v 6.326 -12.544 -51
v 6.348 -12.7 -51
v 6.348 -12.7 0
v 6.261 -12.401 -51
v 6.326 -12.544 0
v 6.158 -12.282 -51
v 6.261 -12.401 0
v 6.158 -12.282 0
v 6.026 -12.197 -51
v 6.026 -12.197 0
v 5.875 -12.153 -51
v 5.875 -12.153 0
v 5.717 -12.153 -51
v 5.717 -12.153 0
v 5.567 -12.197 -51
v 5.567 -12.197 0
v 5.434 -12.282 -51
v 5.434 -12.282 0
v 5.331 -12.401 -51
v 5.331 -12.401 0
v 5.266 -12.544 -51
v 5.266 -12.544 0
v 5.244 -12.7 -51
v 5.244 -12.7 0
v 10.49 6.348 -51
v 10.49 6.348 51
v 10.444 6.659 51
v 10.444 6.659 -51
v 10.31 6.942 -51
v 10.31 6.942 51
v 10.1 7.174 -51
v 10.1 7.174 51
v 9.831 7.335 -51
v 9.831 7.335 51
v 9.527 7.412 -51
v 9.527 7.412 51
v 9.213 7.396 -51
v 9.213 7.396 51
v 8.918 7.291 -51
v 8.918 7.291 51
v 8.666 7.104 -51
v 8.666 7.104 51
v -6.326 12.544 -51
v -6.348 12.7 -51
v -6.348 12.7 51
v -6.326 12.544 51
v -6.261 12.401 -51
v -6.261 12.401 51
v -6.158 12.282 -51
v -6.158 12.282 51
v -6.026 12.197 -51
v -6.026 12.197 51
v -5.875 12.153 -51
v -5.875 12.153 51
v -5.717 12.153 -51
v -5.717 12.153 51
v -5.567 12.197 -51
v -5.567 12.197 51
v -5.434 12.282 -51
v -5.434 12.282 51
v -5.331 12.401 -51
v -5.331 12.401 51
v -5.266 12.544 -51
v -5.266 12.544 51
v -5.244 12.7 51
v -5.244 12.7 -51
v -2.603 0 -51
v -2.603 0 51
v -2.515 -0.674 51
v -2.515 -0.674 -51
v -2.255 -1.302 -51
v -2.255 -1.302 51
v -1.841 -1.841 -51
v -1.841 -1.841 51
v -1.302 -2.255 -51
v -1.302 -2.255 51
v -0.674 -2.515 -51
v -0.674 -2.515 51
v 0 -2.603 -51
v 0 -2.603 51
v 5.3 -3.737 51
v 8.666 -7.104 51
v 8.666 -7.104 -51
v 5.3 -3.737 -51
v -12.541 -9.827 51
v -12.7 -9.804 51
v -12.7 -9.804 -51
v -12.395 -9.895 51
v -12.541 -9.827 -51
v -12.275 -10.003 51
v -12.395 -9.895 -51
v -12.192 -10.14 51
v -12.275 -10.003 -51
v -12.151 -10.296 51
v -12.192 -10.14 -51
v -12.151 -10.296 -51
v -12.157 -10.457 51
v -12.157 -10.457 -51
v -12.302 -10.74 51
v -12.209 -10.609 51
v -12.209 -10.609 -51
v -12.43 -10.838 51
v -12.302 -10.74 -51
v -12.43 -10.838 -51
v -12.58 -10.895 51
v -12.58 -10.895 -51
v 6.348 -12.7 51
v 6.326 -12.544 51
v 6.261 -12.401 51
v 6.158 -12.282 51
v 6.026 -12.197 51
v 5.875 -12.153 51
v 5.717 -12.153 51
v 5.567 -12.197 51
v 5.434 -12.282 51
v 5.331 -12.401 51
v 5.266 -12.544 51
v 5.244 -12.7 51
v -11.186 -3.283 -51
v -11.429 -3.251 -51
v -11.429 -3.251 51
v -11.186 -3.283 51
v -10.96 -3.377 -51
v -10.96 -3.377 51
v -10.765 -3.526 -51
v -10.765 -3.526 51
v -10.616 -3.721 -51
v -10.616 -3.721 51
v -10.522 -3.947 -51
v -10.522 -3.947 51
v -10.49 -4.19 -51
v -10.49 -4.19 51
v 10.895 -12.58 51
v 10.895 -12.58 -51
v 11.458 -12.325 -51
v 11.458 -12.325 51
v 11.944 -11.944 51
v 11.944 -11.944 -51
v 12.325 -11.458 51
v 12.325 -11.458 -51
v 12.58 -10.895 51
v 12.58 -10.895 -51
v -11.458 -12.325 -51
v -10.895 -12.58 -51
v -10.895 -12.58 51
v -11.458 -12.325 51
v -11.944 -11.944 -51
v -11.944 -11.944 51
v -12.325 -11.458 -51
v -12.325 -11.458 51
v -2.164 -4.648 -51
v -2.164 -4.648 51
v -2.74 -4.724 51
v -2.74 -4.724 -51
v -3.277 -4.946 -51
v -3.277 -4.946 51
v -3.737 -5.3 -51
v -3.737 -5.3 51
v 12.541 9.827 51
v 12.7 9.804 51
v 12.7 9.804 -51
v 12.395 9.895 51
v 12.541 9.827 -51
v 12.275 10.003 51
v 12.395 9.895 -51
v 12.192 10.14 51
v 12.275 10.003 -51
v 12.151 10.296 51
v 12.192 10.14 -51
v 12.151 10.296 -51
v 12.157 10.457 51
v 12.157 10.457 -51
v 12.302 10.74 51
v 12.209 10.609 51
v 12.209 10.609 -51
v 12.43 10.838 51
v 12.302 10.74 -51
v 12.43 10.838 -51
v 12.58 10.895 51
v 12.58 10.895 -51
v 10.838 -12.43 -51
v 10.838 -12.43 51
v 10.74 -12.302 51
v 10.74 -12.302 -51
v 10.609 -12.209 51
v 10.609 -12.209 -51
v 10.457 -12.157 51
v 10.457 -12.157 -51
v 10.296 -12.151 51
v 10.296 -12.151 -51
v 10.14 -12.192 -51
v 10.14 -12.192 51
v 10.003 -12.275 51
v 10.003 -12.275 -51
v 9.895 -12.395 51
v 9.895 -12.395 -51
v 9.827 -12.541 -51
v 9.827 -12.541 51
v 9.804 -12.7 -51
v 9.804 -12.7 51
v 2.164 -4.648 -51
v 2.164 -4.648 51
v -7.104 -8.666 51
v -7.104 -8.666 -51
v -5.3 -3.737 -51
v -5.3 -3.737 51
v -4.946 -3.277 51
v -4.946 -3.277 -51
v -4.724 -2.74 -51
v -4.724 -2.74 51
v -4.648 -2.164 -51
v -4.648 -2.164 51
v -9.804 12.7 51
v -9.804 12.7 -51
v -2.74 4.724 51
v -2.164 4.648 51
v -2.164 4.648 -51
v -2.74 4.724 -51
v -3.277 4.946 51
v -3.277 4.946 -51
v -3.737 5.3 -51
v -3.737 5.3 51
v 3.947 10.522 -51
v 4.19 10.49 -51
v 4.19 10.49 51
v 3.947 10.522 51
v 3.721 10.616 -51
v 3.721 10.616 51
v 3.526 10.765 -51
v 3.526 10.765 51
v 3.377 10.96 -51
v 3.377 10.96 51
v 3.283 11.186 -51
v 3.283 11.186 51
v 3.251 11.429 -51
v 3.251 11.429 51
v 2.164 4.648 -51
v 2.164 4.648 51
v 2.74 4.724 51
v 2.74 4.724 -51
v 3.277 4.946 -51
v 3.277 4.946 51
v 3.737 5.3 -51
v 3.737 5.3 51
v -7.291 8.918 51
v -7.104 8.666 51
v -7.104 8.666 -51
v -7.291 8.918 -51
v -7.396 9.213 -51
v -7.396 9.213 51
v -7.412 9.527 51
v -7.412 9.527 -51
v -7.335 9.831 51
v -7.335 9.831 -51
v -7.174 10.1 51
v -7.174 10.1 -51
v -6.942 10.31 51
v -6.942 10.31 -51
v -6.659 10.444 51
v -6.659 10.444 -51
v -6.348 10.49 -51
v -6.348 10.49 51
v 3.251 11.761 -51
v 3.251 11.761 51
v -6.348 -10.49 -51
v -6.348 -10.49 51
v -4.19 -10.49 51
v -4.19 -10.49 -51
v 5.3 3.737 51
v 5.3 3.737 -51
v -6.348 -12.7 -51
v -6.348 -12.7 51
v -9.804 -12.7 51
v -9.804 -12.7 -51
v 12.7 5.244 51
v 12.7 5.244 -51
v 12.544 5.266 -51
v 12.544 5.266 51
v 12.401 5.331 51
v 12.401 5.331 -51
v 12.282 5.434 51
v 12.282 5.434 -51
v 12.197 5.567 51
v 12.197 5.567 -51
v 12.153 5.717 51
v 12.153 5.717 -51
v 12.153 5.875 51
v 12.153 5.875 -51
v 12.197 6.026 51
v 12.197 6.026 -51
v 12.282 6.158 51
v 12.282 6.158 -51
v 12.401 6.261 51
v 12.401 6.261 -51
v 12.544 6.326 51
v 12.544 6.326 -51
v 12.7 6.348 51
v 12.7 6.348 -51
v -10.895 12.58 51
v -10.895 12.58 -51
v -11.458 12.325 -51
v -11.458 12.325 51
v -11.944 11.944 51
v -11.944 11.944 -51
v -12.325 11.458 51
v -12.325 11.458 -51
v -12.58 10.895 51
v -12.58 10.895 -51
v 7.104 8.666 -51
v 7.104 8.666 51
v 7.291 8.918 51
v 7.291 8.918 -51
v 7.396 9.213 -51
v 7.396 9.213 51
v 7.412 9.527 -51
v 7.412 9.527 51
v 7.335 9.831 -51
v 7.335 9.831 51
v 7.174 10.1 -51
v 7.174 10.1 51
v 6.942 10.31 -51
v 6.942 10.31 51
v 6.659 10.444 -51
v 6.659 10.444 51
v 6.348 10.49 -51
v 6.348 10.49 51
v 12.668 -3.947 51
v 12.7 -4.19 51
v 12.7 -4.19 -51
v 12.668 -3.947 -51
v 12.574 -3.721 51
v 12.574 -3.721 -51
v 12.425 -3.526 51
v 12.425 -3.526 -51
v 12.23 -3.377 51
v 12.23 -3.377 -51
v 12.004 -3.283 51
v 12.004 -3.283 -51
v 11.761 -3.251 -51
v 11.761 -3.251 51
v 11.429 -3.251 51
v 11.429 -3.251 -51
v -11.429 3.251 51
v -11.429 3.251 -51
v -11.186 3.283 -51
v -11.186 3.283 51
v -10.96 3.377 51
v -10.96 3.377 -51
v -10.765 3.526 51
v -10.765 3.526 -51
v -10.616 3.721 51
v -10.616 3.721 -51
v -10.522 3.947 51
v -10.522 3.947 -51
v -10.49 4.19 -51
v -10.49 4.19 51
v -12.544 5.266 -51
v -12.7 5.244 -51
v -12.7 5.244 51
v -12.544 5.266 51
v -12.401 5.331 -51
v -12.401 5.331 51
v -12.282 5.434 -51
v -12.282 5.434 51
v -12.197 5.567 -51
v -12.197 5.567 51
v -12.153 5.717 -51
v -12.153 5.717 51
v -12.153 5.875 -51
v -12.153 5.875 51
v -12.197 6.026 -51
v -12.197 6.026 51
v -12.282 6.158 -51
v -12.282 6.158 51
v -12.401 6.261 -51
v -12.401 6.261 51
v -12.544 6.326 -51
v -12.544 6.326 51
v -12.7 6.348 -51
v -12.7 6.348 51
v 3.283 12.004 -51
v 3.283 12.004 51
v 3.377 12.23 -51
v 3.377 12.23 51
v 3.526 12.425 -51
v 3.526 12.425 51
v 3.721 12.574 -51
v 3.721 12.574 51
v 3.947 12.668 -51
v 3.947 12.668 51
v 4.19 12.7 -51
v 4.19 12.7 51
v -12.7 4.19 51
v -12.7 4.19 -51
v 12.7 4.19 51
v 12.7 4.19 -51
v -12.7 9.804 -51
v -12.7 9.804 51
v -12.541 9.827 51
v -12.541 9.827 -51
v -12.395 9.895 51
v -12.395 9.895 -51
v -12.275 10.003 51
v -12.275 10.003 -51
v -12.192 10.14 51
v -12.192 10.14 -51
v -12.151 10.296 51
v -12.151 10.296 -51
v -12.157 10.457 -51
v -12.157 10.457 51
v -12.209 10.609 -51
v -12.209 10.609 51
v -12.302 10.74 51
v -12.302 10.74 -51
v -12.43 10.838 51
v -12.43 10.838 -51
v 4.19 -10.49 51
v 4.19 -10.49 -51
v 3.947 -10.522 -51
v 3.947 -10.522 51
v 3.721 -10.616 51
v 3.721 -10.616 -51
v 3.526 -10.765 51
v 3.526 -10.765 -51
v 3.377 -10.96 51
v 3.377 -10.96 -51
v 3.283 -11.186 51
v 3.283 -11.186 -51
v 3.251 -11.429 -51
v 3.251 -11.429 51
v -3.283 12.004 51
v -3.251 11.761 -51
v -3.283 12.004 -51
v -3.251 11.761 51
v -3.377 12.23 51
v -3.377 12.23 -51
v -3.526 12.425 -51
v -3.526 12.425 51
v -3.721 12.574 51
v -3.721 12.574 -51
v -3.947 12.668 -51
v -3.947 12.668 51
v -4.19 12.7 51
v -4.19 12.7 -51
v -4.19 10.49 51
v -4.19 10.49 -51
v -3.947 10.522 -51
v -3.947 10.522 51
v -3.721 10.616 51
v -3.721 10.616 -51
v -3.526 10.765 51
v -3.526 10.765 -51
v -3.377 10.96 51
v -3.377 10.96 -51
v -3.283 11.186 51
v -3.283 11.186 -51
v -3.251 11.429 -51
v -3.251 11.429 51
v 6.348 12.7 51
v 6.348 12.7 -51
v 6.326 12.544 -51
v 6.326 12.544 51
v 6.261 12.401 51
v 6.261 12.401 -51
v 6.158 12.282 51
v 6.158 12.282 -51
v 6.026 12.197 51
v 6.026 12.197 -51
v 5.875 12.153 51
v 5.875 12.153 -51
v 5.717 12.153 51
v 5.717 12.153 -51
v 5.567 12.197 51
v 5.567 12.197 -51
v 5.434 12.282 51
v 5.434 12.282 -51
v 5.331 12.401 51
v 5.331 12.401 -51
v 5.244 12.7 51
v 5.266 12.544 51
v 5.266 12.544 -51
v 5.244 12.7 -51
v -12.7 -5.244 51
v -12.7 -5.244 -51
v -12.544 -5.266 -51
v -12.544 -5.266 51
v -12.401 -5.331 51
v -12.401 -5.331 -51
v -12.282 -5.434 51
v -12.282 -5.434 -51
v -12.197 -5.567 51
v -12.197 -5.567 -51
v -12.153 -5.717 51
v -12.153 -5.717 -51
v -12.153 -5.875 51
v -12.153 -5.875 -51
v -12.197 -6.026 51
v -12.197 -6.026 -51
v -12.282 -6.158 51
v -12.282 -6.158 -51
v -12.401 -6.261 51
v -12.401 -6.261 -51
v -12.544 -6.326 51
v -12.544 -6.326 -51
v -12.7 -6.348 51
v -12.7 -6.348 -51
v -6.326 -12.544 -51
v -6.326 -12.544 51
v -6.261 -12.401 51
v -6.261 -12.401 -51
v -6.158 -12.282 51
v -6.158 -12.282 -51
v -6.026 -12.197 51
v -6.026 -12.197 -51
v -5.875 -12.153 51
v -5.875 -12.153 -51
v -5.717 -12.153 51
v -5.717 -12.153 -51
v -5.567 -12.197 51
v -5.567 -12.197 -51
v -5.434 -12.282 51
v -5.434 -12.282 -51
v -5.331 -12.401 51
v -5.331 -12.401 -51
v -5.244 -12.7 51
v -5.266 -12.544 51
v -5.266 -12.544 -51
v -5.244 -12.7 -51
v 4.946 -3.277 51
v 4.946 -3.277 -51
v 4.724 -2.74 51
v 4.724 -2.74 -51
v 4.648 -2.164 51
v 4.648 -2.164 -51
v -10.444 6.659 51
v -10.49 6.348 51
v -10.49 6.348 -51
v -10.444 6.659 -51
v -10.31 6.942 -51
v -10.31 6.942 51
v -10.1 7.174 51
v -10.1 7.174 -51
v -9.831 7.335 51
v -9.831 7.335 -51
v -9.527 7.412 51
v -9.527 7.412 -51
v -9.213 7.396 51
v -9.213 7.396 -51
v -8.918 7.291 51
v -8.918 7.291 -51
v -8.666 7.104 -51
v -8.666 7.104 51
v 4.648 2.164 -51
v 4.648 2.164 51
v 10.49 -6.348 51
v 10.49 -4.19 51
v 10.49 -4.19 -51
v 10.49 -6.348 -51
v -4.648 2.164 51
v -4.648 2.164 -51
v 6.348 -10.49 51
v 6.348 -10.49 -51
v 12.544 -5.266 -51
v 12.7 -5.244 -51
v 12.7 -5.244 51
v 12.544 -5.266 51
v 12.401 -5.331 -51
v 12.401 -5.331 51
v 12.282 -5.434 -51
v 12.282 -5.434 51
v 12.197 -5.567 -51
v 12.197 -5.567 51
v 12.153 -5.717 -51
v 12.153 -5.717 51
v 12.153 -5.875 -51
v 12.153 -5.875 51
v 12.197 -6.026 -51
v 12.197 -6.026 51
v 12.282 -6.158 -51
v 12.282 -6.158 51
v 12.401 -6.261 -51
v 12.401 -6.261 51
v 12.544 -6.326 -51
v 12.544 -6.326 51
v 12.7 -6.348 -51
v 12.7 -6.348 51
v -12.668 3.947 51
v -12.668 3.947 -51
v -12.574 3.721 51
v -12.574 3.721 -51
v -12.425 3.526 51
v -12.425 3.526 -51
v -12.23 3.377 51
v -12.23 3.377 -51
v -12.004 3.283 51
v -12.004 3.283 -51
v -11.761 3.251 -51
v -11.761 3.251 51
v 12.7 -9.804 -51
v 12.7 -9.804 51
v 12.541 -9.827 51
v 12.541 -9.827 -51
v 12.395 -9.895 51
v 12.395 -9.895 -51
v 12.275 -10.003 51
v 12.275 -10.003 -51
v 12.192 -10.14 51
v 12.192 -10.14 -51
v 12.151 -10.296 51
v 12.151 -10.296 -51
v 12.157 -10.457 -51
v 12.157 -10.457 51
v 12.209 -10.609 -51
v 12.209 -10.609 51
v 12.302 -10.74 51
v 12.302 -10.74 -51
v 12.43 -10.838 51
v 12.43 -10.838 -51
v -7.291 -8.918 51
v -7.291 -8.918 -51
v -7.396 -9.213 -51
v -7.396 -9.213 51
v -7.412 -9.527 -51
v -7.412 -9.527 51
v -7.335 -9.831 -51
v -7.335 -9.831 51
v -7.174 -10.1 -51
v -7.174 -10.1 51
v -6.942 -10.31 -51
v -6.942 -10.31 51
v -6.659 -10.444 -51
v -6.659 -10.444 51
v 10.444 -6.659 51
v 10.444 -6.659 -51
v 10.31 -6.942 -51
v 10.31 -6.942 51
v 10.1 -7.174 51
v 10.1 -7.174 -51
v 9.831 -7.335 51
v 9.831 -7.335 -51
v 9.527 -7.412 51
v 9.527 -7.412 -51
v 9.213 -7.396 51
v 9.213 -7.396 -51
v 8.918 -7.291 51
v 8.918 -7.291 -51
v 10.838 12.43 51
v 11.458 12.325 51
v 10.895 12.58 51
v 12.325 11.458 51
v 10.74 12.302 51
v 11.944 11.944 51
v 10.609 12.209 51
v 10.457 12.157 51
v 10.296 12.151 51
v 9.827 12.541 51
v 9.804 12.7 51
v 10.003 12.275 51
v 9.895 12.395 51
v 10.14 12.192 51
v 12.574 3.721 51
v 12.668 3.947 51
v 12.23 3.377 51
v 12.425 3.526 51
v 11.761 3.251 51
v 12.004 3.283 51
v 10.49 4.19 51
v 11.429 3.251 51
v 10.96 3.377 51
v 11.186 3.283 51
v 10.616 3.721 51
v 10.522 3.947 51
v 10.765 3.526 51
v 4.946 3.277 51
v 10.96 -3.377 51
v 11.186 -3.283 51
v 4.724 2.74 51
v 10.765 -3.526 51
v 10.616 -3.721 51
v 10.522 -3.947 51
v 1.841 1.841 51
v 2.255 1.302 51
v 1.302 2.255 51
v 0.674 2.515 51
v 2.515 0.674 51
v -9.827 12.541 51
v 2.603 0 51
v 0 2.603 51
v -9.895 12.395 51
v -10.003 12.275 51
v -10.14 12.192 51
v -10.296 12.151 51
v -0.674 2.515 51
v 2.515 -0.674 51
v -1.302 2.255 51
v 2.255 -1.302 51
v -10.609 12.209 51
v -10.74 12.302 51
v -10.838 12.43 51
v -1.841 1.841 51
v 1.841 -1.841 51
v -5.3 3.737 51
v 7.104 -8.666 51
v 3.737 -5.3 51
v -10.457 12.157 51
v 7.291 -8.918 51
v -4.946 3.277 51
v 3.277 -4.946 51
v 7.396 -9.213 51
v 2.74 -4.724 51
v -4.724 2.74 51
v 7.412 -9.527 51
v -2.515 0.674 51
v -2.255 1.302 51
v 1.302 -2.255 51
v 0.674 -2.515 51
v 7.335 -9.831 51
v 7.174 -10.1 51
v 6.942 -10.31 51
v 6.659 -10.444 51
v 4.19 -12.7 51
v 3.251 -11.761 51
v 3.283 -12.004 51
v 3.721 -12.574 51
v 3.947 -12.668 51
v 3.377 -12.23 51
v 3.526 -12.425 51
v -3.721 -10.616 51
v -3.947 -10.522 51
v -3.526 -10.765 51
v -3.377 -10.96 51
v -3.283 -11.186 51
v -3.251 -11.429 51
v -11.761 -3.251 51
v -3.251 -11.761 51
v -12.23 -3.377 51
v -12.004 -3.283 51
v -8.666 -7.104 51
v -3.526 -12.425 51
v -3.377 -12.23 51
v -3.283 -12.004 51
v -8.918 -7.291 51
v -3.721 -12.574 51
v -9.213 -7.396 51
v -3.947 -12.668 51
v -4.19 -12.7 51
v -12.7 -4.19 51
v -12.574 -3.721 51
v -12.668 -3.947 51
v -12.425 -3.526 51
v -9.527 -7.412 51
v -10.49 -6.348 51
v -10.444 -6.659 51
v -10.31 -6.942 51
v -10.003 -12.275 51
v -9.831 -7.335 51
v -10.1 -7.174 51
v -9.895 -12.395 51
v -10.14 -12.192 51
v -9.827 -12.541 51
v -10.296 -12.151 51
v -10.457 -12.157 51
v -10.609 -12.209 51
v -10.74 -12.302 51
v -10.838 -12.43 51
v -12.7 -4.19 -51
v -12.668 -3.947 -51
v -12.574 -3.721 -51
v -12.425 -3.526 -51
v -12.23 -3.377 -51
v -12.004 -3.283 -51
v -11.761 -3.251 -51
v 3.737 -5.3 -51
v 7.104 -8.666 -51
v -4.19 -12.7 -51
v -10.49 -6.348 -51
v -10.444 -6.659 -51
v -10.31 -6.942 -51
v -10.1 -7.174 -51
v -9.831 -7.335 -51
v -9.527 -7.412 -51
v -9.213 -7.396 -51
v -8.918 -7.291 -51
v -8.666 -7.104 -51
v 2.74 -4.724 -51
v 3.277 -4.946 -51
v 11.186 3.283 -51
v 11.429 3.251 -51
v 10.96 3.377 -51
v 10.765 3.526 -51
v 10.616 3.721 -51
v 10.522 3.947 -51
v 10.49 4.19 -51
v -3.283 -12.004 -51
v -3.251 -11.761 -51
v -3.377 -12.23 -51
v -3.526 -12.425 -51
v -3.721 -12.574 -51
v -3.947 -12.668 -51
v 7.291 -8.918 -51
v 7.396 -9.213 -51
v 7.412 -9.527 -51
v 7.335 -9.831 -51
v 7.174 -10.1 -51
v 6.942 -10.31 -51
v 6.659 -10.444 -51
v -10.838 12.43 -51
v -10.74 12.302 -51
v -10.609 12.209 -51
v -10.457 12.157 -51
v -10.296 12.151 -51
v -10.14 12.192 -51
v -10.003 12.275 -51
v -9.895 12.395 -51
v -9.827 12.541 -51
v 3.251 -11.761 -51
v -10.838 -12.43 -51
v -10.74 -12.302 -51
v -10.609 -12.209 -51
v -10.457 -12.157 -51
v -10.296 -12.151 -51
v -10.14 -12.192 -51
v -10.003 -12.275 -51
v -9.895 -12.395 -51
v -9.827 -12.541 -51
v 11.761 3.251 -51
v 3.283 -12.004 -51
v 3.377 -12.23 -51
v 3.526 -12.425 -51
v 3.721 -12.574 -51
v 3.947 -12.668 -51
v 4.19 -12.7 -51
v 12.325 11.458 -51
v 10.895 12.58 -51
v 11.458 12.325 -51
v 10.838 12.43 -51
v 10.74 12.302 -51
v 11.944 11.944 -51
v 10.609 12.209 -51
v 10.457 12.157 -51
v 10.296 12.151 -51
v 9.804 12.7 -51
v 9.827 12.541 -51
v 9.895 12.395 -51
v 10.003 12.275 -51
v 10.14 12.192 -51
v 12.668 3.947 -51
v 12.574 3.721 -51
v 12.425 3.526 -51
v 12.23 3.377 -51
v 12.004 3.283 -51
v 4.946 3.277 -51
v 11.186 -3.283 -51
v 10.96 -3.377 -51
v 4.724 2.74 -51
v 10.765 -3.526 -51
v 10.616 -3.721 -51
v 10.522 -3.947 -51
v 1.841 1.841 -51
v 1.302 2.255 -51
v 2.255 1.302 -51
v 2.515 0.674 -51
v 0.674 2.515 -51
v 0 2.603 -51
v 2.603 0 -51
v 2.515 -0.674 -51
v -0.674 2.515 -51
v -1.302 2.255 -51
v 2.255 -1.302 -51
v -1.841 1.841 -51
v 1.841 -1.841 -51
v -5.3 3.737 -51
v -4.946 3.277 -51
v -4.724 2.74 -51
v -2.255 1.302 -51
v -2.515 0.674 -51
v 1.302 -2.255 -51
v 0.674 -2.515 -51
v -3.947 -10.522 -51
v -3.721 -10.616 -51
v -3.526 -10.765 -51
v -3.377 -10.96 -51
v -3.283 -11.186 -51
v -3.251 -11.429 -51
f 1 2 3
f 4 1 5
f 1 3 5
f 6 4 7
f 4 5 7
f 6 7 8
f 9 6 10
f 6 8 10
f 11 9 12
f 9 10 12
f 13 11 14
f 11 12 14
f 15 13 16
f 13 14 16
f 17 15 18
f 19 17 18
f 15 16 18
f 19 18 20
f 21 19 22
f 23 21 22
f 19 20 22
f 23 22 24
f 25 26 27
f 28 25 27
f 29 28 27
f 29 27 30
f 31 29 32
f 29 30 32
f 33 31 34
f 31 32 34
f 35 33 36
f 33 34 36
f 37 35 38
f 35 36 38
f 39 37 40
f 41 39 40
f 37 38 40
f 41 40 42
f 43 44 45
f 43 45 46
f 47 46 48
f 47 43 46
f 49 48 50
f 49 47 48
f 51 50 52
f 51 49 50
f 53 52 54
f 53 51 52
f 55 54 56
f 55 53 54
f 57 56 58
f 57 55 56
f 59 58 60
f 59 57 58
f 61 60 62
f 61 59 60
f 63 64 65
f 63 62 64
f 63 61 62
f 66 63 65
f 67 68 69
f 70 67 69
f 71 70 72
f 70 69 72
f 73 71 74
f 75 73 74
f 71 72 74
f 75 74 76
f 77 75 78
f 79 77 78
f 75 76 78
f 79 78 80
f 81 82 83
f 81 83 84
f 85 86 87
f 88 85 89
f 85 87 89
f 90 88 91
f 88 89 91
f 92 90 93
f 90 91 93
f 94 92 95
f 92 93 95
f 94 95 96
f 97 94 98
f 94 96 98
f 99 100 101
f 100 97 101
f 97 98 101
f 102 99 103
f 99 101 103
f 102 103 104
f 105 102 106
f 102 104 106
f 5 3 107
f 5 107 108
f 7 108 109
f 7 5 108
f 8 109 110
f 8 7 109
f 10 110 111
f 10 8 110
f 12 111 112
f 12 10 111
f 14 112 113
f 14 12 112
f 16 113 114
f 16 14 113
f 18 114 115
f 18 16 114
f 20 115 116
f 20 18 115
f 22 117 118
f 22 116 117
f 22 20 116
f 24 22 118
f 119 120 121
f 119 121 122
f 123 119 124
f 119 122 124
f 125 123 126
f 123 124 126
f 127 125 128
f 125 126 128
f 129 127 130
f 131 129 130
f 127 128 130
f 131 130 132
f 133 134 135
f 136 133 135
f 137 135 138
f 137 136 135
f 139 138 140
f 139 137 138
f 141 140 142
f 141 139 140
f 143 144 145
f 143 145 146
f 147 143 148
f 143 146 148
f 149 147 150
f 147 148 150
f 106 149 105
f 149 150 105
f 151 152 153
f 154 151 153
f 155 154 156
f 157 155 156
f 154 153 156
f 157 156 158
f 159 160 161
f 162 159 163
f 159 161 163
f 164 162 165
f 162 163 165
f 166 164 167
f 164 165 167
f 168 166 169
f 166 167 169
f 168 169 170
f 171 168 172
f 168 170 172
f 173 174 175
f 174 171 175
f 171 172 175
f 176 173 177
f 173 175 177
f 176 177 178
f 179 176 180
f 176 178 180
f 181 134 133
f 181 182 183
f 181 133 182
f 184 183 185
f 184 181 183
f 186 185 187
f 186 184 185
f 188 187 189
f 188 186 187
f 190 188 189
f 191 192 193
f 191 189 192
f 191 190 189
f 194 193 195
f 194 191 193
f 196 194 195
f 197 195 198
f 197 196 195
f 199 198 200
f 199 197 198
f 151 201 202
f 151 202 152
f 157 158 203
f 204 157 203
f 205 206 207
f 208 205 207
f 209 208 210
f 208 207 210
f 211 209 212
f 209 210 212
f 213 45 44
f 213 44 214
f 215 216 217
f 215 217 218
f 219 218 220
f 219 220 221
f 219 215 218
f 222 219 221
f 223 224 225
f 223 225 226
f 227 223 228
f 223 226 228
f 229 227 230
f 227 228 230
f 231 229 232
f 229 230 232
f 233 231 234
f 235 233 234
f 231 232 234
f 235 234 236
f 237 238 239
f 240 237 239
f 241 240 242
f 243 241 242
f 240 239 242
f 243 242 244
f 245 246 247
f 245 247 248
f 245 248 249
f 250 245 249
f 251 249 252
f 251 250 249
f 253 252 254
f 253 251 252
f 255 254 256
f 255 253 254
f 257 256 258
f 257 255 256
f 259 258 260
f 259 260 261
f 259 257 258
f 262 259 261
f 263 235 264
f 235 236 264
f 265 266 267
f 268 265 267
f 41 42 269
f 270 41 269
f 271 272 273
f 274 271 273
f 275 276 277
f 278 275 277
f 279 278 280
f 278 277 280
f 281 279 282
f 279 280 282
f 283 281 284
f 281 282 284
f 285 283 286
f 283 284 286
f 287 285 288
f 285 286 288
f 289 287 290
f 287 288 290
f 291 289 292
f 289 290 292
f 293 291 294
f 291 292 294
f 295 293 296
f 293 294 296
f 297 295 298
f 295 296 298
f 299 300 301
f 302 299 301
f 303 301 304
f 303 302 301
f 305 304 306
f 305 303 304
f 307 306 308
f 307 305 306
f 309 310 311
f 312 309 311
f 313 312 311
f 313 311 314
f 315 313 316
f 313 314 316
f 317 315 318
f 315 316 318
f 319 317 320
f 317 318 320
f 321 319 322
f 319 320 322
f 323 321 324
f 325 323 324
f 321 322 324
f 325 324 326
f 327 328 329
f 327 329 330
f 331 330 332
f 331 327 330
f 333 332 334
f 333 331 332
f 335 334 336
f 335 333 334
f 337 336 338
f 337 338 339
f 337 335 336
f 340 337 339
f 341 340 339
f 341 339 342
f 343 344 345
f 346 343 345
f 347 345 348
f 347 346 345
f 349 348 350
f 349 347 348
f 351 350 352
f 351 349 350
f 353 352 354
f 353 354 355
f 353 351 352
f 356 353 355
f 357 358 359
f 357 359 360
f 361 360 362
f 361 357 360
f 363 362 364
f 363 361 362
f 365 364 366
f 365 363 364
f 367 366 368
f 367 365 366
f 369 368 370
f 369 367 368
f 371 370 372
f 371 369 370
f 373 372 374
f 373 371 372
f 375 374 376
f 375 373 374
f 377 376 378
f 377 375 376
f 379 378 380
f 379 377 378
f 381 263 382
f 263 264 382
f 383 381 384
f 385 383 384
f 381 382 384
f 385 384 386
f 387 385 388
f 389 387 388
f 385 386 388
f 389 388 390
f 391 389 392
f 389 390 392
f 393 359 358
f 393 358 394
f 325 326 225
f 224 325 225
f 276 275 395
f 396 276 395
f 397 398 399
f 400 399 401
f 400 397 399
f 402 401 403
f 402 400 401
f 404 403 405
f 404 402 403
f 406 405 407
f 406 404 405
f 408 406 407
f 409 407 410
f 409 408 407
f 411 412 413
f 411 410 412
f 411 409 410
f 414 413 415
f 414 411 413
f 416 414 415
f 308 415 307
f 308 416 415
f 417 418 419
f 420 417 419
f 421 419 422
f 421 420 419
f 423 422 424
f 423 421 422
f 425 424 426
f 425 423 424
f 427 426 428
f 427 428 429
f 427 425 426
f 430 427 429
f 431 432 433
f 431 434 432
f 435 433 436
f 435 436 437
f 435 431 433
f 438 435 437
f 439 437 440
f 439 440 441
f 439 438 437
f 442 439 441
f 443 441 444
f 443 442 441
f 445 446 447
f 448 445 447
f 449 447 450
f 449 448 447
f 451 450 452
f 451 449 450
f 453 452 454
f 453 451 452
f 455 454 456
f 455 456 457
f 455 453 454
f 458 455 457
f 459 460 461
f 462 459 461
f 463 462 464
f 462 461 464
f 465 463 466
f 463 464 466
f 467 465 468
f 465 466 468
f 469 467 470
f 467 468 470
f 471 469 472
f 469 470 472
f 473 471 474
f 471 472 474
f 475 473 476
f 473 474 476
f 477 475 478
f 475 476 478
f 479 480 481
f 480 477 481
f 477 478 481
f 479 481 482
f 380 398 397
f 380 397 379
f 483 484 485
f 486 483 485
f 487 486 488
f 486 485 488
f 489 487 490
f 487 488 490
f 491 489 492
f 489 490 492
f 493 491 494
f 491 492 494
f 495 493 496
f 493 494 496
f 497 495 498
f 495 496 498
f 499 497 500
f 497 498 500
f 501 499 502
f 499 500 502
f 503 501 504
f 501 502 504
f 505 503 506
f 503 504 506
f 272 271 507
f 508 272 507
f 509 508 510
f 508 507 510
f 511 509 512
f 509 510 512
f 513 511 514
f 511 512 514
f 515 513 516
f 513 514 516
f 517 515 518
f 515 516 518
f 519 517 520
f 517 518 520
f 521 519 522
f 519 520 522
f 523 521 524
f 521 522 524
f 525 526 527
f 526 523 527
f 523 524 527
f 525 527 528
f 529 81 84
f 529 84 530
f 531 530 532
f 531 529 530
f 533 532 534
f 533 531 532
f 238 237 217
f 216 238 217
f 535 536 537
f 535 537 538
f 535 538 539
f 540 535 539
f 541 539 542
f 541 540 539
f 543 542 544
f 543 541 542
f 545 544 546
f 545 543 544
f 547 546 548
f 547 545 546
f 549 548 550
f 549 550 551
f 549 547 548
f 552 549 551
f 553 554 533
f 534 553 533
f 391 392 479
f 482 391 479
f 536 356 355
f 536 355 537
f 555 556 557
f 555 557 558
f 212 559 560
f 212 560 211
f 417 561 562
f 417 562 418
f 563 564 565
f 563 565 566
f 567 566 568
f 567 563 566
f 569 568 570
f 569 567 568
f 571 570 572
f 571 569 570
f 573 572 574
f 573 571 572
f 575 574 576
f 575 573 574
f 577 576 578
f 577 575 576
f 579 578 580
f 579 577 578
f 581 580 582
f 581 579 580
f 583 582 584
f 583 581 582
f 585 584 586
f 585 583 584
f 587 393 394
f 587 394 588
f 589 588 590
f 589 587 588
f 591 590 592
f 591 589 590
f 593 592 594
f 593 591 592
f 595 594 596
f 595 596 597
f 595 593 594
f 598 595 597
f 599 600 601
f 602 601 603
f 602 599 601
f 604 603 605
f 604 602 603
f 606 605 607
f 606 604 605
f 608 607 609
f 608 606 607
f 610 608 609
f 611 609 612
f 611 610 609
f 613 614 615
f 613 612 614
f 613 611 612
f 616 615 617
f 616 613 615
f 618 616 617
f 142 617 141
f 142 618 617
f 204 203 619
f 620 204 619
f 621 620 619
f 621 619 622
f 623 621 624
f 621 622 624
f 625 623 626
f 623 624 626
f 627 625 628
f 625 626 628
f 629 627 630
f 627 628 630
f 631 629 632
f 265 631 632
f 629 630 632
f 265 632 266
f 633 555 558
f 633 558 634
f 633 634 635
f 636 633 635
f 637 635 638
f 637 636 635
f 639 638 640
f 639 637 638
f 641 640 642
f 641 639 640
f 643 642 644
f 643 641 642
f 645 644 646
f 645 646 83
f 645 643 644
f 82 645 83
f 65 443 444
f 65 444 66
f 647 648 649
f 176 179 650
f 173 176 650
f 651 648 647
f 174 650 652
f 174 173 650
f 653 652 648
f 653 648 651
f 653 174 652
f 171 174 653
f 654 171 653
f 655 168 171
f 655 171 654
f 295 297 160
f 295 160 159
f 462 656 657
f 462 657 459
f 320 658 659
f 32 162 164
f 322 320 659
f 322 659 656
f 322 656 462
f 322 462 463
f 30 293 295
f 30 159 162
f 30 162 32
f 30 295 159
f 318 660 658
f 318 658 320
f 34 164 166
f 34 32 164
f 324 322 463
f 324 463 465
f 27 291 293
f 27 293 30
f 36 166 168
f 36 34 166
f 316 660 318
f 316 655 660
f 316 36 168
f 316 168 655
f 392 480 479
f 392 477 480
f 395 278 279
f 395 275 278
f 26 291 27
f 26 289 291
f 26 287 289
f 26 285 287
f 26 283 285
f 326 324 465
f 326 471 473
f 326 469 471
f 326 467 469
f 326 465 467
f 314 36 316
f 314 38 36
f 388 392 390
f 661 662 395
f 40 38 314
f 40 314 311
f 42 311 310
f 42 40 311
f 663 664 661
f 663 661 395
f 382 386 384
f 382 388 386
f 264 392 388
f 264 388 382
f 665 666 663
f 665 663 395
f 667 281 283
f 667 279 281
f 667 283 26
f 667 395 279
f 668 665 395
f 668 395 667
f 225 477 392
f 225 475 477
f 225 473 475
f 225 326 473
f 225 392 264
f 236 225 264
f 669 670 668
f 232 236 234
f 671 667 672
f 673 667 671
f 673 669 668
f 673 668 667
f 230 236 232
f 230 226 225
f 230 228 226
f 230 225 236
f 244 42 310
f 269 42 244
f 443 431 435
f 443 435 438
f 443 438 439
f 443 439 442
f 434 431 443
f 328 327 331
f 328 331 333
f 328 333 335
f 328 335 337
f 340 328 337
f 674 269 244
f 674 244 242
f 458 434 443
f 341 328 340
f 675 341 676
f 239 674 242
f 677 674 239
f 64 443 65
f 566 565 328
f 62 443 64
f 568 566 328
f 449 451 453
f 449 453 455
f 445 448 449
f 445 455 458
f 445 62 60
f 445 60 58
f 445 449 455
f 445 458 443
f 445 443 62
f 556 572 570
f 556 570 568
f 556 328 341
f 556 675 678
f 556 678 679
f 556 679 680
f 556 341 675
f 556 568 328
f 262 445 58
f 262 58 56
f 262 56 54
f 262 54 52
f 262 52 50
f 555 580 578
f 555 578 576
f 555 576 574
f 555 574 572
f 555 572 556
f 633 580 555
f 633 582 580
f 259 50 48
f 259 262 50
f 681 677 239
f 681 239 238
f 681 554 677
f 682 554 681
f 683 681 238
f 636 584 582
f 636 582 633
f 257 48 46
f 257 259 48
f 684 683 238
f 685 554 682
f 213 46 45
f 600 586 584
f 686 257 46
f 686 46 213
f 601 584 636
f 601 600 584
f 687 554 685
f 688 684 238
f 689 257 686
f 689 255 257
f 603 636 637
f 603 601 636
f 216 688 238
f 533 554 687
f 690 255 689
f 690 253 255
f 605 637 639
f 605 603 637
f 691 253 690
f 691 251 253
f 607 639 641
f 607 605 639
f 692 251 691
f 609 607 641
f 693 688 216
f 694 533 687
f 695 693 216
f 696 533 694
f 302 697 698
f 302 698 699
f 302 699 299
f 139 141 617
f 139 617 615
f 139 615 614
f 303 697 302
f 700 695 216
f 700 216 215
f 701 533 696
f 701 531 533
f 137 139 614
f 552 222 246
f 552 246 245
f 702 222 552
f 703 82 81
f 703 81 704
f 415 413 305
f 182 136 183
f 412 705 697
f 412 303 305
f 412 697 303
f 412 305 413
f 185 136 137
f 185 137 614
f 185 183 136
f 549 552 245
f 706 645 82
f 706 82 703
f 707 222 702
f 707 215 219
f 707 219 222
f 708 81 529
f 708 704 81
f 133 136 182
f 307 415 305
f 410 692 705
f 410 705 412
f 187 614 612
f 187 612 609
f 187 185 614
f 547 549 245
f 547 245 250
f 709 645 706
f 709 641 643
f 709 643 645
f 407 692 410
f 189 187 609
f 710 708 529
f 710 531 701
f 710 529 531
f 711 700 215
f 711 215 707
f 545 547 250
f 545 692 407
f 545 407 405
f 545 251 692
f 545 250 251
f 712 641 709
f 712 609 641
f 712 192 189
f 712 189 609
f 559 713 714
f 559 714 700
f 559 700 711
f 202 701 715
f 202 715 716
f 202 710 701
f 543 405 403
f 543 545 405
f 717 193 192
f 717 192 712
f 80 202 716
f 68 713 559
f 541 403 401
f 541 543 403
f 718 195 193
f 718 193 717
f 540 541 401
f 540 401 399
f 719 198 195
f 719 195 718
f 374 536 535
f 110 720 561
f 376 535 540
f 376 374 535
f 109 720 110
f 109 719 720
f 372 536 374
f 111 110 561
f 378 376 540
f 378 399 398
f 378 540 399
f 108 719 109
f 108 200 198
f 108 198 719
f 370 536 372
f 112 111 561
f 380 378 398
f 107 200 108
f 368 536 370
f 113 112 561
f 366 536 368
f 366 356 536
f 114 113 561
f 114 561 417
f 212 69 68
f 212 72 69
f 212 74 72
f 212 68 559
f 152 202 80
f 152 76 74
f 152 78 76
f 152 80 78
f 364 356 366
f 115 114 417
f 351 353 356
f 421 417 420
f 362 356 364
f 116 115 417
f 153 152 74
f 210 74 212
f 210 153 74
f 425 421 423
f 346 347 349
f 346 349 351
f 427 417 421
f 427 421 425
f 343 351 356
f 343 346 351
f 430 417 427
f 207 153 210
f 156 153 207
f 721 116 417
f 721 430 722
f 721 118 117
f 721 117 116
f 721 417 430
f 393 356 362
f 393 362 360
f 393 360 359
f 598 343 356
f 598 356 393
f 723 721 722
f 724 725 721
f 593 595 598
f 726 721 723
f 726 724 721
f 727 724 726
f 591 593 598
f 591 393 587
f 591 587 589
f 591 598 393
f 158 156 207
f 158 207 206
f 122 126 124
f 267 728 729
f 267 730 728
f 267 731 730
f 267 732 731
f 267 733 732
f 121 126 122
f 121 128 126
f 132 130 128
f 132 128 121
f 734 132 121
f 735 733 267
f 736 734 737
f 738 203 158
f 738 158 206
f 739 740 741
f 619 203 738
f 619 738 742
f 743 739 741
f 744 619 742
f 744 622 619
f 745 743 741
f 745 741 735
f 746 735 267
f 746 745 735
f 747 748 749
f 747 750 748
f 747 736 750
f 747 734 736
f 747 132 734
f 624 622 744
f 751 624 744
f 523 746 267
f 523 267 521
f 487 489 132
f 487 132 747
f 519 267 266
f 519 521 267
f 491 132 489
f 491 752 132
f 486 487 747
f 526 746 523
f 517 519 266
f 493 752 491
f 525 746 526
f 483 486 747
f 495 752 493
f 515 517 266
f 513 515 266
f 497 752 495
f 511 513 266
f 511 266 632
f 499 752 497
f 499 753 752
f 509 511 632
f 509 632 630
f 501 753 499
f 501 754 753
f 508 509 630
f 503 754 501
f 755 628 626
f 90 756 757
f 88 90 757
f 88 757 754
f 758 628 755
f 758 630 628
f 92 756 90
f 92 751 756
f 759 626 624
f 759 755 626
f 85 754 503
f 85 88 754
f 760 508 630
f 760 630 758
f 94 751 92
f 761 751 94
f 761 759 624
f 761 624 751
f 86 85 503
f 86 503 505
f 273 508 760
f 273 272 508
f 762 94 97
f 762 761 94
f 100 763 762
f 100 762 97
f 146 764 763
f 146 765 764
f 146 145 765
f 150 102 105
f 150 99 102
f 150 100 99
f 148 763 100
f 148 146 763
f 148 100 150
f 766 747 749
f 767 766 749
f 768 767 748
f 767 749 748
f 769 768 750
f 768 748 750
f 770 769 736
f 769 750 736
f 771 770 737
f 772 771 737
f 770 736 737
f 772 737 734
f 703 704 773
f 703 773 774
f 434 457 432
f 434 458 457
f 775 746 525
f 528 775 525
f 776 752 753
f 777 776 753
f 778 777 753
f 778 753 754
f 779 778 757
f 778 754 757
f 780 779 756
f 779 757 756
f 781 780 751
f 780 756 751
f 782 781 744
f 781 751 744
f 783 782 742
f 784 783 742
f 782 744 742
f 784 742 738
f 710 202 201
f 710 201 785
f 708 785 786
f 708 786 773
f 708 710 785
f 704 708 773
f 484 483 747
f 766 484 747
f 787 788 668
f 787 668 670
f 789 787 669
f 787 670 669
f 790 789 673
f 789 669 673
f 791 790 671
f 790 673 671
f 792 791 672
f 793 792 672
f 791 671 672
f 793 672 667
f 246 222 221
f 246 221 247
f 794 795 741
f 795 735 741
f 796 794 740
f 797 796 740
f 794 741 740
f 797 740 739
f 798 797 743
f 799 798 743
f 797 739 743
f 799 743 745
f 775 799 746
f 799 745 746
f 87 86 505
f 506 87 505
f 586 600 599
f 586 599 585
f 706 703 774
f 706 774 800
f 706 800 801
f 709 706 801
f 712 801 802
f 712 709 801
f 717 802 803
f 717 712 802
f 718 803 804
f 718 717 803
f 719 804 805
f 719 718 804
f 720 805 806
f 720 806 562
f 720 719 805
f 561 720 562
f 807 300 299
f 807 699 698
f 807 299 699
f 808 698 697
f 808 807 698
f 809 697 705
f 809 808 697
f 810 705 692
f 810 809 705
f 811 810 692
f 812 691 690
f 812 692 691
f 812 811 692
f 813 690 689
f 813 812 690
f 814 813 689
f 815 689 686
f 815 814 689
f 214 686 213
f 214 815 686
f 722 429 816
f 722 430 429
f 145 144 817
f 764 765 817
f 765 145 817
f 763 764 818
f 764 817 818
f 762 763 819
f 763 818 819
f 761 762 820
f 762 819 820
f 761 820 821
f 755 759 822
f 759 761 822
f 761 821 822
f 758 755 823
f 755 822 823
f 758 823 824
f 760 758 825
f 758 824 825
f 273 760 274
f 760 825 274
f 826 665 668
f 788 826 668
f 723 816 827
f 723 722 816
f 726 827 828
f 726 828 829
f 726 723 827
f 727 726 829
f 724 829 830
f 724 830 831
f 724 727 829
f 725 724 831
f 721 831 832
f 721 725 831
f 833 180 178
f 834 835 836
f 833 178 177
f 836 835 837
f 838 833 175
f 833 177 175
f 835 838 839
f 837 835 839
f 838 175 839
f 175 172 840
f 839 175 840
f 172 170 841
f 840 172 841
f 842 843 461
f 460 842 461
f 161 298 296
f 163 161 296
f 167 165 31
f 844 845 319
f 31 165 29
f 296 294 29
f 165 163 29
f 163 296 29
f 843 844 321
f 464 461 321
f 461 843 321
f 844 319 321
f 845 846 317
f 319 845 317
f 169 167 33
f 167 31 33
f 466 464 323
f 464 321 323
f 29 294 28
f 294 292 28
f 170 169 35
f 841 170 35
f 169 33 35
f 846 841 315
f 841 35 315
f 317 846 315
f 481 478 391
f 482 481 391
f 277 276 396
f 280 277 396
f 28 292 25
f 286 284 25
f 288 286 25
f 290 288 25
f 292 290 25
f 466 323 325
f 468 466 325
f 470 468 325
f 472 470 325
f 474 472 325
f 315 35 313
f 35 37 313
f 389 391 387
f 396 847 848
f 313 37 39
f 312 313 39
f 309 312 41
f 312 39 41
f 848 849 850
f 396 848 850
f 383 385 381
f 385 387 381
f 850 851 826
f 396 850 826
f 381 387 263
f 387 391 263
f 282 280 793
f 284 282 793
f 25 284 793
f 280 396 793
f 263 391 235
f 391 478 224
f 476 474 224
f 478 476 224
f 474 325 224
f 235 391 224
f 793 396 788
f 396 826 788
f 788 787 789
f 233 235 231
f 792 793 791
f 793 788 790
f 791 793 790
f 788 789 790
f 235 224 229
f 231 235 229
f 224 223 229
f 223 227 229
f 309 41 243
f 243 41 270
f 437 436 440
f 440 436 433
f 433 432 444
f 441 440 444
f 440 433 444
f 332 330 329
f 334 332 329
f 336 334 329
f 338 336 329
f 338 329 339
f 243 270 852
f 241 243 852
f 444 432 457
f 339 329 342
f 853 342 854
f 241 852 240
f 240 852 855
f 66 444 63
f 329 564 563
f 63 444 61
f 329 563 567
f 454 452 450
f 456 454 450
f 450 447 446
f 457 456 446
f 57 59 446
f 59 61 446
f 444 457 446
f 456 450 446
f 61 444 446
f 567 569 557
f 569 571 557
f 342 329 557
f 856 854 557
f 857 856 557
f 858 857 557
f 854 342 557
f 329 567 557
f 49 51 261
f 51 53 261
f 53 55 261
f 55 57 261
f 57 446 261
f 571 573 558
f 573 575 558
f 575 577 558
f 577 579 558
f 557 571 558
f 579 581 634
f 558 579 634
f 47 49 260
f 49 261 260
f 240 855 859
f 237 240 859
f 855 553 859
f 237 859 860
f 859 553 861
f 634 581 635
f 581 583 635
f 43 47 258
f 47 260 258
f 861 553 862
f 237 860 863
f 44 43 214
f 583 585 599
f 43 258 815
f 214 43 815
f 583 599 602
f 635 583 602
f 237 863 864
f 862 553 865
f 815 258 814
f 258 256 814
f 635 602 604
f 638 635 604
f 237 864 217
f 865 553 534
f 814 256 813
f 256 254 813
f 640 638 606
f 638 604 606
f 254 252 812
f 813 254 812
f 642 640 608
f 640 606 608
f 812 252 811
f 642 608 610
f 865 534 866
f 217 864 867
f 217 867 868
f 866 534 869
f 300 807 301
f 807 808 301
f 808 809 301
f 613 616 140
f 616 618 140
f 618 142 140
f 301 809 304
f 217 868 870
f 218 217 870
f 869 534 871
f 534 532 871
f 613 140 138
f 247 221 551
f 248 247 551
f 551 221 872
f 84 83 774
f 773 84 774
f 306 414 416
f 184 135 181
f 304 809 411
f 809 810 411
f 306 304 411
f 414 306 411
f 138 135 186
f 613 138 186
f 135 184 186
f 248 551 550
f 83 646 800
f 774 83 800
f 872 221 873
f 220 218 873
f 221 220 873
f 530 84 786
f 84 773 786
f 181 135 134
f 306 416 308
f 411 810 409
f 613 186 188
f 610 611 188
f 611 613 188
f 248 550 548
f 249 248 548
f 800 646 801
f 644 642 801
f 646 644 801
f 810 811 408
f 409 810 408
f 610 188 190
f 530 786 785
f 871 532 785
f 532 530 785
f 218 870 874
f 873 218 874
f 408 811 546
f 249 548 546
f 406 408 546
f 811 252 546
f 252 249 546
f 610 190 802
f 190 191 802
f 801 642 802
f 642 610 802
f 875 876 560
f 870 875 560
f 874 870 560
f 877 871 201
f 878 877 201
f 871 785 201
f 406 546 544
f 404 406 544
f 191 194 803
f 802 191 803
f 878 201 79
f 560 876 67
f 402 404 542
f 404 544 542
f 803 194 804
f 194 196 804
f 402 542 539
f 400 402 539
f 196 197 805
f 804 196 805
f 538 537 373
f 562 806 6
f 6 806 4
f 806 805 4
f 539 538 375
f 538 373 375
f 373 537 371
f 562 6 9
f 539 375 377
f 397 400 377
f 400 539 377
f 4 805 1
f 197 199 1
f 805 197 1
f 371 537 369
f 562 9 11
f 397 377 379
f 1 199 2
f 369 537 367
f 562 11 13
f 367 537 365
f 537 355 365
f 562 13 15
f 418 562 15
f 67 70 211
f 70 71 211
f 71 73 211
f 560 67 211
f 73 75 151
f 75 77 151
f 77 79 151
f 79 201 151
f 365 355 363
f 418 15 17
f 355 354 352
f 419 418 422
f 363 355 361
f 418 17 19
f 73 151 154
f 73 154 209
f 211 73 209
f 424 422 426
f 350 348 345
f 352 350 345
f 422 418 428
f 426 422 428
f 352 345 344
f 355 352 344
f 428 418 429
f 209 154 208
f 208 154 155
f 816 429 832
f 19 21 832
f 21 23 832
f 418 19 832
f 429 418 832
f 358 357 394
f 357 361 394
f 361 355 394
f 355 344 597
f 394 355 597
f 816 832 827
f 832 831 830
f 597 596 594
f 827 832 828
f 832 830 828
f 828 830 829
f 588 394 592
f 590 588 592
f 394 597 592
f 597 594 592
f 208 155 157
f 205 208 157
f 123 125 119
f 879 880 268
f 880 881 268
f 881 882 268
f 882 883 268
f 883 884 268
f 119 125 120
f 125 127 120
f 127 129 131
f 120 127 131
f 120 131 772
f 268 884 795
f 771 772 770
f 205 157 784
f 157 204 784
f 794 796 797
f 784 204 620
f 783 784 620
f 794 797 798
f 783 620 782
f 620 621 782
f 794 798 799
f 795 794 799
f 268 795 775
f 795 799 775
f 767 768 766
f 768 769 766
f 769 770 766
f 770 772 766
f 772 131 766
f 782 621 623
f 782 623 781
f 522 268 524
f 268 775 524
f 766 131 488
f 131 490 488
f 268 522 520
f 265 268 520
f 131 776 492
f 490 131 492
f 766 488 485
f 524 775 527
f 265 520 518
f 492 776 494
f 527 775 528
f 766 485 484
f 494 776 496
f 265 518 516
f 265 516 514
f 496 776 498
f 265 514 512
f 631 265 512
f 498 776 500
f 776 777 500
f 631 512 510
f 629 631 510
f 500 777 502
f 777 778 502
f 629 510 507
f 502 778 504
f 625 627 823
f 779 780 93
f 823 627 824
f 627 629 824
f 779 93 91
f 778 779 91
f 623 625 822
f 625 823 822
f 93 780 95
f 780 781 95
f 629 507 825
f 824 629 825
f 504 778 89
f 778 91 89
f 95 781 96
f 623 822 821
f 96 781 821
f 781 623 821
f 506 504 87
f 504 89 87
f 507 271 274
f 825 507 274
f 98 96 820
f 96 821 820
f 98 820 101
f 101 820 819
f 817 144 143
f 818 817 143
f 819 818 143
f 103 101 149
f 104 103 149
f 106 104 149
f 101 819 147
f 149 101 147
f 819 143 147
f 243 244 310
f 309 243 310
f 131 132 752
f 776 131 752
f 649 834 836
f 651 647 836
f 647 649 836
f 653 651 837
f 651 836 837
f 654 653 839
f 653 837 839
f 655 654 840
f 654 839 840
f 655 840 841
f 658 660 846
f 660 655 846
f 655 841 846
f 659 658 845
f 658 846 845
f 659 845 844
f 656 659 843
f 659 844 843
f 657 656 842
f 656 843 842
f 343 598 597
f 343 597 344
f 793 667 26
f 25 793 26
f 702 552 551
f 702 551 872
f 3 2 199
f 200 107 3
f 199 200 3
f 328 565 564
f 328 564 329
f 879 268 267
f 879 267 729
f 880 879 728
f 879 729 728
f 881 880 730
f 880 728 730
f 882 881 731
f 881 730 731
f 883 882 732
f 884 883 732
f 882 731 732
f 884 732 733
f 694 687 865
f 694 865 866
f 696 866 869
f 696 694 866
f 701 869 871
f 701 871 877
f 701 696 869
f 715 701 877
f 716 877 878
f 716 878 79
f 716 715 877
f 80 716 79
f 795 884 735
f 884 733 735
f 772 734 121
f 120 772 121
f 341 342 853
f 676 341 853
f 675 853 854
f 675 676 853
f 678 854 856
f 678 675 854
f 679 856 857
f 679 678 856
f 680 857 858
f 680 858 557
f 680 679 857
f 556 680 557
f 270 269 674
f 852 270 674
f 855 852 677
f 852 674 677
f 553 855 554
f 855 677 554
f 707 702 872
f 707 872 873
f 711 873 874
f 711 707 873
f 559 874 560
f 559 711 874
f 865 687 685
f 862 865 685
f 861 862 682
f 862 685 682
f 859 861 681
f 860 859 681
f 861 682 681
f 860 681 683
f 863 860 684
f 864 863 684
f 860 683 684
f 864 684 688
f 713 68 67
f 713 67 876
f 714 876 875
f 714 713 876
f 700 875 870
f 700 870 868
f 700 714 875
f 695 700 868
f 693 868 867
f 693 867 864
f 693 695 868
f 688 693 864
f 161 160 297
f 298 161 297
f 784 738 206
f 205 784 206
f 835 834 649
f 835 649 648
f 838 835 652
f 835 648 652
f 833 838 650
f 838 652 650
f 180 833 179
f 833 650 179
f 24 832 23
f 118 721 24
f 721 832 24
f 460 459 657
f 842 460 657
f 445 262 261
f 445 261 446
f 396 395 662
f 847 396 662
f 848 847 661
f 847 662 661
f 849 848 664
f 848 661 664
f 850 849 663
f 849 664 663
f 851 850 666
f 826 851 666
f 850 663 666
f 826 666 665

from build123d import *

# Parameters (mm, degrees)
BOSS_EXTRUDE1_DEPTH     = 51.000025
SKETCH5_R               = 0.55245
CUT_EXTRUDE1_DEPTH      = 52.000025
CUT_EXTRUDE1_DEPTH_BACK = 52.000025


with BuildPart() as part:
    # Sketch4 → Boss-Extrude1 (new body, symmetric)
    with BuildSketch(Plane.XY):
        with BuildLine():
            Line((4.190365, -12.7), (10.11729625, -12.7))
            ThreePointArc((10.11729625, -12.7), (11.943543585, -11.943543585), (12.7, -10.11729625))
            Line((12.7, -10.11729625), (12.7, -4.190365))
            ThreePointArc((12.7, -4.190365), (12.42492494, -3.52627506), (11.760835, -3.2512))
            Line((11.760835, -3.2512), (11.429365, -3.2512))
            ThreePointArc((11.429365, -3.2512), (10.76527506, -3.52627506), (10.4902, -4.190365))
            Line((10.4902, -4.190365), (10.4902, -6.348478019))
            ThreePointArc((10.4902, -6.348478019), (9.830707141, -7.335478831), (8.666460301, -7.103895736))
            Line((8.666460301, -7.103895736), (5.299899128, -3.737334563))
            ThreePointArc((5.299899128, -3.737334563), (4.817571085, -3.015479634), (4.6482, -2.16399369))
            Line((4.6482, -2.16399369), (4.6482, 0))
            Line((4.6482, 0), (2.6035, 0))
            ThreePointArc((2.6035, 0), (1.840952505, -1.840952505), (0, -2.6035))
            Line((0, -2.6035), (0, -4.6482))
            Line((0, -4.6482), (2.16399369, -4.6482))
            ThreePointArc((2.16399369, -4.6482), (3.015479634, -4.817571085), (3.737334563, -5.299899128))
            Line((3.737334563, -5.299899128), (7.103895736, -8.666460301))
            ThreePointArc((7.103895736, -8.666460301), (7.335478831, -9.830707141), (6.348478019, -10.4902))
            Line((6.348478019, -10.4902), (4.190365, -10.4902))
            ThreePointArc((4.190365, -10.4902), (3.52627506, -10.76527506), (3.2512, -11.429365))
            Line((3.2512, -11.429365), (3.2512, -11.760835))
            ThreePointArc((3.2512, -11.760835), (3.52627506, -12.42492494), (4.190365, -12.7))
        make_face()
    extrude(amount=BOSS_EXTRUDE1_DEPTH, both=True)

    # Sketch5 → Cut-Extrude1 (cut, two sides)
    with BuildSketch(Plane.XY) as cut_extrude1_sk:
        with Locations((10.356153152, -12.7)):
            Circle(SKETCH5_R)
        with Locations((5.796028019, -12.7)):
            Circle(SKETCH5_R)
        with Locations((12.7, -10.356153152)):
            Circle(SKETCH5_R)
        with Locations((12.7, -5.796028019)):
            Circle(SKETCH5_R)
    extrude(amount=CUT_EXTRUDE1_DEPTH, mode=Mode.SUBTRACT)
    extrude(cut_extrude1_sk.sketch, amount=-CUT_EXTRUDE1_DEPTH_BACK, mode=Mode.SUBTRACT)

    # Mirror1: part across plane


with BuildPart() as part_1:
    add(part.part)
    add(part.part.mirror(Plane(origin=(0, 0, 0), x_dir=(0, 0, 1), z_dir=(1, 0, 0))))

    # Mirror2: part across plane


with BuildPart() as part_2:
    add(part_1.part)
    add(part_1.part.mirror(Plane.ZX))


solid = part_2.part
